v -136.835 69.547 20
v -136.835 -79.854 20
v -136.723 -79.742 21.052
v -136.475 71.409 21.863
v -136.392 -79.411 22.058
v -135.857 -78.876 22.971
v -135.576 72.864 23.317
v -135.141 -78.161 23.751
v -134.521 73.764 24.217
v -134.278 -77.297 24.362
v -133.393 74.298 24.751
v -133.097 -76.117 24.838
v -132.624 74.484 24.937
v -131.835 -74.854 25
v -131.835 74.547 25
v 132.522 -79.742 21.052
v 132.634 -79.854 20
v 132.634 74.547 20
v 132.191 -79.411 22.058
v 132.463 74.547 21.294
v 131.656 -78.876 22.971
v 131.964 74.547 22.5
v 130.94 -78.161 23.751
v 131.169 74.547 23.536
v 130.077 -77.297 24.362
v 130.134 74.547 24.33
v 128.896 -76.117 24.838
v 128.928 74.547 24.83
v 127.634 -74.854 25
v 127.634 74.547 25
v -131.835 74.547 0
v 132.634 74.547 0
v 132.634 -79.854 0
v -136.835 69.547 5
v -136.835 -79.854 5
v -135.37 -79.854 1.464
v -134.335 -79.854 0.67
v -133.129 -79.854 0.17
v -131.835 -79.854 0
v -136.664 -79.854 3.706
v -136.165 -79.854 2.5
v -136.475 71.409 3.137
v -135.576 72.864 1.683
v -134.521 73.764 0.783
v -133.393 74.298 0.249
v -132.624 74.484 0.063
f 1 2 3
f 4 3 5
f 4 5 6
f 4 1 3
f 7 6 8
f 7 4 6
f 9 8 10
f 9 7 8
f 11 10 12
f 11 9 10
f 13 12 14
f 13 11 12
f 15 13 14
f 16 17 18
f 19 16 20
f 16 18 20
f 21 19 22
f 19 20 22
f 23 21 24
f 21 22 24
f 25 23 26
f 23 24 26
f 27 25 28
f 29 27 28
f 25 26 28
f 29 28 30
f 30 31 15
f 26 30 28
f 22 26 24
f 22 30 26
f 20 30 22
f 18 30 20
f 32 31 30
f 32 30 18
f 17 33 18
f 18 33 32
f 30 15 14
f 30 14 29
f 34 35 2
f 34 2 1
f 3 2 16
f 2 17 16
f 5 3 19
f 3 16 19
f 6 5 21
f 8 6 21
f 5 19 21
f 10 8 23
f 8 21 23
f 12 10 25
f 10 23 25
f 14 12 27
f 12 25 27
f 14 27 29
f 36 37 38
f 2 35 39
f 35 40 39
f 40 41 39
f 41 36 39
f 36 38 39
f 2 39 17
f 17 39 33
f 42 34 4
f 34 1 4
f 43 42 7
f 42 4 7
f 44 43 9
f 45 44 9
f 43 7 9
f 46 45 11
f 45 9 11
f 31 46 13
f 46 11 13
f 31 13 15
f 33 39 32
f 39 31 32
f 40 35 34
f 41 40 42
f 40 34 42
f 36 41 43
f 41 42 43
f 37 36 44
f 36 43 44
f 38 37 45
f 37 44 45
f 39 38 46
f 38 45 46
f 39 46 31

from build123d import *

# Parameters (mm, degrees)
F0_W     = 269.468337
F0_H     = 154.401242
F1_DEPTH = 25
F2_R     = 5


with BuildPart() as f1:
    # F0 (on Top) → F1 (new body)
    with BuildSketch(Plane.XY):
        with Locations((-2.100512, -2.653651)):
            Rectangle(F0_W, F0_H)
    extrude(amount=F1_DEPTH)

    # F2
    f2_edges = [f1.edges().sort_by_distance(p)[0] for p in [
        (-2.100512, -79.854272, 25),
        (132.633656, -2.653651, 25),
        (-136.834681, -2.653651, 25),
        (-136.834681, -2.653651, 0),
        (-136.834681, 74.54697, 12.5),
    ]]
    fillet(f2_edges, radius=F2_R)


solid = f1.part
